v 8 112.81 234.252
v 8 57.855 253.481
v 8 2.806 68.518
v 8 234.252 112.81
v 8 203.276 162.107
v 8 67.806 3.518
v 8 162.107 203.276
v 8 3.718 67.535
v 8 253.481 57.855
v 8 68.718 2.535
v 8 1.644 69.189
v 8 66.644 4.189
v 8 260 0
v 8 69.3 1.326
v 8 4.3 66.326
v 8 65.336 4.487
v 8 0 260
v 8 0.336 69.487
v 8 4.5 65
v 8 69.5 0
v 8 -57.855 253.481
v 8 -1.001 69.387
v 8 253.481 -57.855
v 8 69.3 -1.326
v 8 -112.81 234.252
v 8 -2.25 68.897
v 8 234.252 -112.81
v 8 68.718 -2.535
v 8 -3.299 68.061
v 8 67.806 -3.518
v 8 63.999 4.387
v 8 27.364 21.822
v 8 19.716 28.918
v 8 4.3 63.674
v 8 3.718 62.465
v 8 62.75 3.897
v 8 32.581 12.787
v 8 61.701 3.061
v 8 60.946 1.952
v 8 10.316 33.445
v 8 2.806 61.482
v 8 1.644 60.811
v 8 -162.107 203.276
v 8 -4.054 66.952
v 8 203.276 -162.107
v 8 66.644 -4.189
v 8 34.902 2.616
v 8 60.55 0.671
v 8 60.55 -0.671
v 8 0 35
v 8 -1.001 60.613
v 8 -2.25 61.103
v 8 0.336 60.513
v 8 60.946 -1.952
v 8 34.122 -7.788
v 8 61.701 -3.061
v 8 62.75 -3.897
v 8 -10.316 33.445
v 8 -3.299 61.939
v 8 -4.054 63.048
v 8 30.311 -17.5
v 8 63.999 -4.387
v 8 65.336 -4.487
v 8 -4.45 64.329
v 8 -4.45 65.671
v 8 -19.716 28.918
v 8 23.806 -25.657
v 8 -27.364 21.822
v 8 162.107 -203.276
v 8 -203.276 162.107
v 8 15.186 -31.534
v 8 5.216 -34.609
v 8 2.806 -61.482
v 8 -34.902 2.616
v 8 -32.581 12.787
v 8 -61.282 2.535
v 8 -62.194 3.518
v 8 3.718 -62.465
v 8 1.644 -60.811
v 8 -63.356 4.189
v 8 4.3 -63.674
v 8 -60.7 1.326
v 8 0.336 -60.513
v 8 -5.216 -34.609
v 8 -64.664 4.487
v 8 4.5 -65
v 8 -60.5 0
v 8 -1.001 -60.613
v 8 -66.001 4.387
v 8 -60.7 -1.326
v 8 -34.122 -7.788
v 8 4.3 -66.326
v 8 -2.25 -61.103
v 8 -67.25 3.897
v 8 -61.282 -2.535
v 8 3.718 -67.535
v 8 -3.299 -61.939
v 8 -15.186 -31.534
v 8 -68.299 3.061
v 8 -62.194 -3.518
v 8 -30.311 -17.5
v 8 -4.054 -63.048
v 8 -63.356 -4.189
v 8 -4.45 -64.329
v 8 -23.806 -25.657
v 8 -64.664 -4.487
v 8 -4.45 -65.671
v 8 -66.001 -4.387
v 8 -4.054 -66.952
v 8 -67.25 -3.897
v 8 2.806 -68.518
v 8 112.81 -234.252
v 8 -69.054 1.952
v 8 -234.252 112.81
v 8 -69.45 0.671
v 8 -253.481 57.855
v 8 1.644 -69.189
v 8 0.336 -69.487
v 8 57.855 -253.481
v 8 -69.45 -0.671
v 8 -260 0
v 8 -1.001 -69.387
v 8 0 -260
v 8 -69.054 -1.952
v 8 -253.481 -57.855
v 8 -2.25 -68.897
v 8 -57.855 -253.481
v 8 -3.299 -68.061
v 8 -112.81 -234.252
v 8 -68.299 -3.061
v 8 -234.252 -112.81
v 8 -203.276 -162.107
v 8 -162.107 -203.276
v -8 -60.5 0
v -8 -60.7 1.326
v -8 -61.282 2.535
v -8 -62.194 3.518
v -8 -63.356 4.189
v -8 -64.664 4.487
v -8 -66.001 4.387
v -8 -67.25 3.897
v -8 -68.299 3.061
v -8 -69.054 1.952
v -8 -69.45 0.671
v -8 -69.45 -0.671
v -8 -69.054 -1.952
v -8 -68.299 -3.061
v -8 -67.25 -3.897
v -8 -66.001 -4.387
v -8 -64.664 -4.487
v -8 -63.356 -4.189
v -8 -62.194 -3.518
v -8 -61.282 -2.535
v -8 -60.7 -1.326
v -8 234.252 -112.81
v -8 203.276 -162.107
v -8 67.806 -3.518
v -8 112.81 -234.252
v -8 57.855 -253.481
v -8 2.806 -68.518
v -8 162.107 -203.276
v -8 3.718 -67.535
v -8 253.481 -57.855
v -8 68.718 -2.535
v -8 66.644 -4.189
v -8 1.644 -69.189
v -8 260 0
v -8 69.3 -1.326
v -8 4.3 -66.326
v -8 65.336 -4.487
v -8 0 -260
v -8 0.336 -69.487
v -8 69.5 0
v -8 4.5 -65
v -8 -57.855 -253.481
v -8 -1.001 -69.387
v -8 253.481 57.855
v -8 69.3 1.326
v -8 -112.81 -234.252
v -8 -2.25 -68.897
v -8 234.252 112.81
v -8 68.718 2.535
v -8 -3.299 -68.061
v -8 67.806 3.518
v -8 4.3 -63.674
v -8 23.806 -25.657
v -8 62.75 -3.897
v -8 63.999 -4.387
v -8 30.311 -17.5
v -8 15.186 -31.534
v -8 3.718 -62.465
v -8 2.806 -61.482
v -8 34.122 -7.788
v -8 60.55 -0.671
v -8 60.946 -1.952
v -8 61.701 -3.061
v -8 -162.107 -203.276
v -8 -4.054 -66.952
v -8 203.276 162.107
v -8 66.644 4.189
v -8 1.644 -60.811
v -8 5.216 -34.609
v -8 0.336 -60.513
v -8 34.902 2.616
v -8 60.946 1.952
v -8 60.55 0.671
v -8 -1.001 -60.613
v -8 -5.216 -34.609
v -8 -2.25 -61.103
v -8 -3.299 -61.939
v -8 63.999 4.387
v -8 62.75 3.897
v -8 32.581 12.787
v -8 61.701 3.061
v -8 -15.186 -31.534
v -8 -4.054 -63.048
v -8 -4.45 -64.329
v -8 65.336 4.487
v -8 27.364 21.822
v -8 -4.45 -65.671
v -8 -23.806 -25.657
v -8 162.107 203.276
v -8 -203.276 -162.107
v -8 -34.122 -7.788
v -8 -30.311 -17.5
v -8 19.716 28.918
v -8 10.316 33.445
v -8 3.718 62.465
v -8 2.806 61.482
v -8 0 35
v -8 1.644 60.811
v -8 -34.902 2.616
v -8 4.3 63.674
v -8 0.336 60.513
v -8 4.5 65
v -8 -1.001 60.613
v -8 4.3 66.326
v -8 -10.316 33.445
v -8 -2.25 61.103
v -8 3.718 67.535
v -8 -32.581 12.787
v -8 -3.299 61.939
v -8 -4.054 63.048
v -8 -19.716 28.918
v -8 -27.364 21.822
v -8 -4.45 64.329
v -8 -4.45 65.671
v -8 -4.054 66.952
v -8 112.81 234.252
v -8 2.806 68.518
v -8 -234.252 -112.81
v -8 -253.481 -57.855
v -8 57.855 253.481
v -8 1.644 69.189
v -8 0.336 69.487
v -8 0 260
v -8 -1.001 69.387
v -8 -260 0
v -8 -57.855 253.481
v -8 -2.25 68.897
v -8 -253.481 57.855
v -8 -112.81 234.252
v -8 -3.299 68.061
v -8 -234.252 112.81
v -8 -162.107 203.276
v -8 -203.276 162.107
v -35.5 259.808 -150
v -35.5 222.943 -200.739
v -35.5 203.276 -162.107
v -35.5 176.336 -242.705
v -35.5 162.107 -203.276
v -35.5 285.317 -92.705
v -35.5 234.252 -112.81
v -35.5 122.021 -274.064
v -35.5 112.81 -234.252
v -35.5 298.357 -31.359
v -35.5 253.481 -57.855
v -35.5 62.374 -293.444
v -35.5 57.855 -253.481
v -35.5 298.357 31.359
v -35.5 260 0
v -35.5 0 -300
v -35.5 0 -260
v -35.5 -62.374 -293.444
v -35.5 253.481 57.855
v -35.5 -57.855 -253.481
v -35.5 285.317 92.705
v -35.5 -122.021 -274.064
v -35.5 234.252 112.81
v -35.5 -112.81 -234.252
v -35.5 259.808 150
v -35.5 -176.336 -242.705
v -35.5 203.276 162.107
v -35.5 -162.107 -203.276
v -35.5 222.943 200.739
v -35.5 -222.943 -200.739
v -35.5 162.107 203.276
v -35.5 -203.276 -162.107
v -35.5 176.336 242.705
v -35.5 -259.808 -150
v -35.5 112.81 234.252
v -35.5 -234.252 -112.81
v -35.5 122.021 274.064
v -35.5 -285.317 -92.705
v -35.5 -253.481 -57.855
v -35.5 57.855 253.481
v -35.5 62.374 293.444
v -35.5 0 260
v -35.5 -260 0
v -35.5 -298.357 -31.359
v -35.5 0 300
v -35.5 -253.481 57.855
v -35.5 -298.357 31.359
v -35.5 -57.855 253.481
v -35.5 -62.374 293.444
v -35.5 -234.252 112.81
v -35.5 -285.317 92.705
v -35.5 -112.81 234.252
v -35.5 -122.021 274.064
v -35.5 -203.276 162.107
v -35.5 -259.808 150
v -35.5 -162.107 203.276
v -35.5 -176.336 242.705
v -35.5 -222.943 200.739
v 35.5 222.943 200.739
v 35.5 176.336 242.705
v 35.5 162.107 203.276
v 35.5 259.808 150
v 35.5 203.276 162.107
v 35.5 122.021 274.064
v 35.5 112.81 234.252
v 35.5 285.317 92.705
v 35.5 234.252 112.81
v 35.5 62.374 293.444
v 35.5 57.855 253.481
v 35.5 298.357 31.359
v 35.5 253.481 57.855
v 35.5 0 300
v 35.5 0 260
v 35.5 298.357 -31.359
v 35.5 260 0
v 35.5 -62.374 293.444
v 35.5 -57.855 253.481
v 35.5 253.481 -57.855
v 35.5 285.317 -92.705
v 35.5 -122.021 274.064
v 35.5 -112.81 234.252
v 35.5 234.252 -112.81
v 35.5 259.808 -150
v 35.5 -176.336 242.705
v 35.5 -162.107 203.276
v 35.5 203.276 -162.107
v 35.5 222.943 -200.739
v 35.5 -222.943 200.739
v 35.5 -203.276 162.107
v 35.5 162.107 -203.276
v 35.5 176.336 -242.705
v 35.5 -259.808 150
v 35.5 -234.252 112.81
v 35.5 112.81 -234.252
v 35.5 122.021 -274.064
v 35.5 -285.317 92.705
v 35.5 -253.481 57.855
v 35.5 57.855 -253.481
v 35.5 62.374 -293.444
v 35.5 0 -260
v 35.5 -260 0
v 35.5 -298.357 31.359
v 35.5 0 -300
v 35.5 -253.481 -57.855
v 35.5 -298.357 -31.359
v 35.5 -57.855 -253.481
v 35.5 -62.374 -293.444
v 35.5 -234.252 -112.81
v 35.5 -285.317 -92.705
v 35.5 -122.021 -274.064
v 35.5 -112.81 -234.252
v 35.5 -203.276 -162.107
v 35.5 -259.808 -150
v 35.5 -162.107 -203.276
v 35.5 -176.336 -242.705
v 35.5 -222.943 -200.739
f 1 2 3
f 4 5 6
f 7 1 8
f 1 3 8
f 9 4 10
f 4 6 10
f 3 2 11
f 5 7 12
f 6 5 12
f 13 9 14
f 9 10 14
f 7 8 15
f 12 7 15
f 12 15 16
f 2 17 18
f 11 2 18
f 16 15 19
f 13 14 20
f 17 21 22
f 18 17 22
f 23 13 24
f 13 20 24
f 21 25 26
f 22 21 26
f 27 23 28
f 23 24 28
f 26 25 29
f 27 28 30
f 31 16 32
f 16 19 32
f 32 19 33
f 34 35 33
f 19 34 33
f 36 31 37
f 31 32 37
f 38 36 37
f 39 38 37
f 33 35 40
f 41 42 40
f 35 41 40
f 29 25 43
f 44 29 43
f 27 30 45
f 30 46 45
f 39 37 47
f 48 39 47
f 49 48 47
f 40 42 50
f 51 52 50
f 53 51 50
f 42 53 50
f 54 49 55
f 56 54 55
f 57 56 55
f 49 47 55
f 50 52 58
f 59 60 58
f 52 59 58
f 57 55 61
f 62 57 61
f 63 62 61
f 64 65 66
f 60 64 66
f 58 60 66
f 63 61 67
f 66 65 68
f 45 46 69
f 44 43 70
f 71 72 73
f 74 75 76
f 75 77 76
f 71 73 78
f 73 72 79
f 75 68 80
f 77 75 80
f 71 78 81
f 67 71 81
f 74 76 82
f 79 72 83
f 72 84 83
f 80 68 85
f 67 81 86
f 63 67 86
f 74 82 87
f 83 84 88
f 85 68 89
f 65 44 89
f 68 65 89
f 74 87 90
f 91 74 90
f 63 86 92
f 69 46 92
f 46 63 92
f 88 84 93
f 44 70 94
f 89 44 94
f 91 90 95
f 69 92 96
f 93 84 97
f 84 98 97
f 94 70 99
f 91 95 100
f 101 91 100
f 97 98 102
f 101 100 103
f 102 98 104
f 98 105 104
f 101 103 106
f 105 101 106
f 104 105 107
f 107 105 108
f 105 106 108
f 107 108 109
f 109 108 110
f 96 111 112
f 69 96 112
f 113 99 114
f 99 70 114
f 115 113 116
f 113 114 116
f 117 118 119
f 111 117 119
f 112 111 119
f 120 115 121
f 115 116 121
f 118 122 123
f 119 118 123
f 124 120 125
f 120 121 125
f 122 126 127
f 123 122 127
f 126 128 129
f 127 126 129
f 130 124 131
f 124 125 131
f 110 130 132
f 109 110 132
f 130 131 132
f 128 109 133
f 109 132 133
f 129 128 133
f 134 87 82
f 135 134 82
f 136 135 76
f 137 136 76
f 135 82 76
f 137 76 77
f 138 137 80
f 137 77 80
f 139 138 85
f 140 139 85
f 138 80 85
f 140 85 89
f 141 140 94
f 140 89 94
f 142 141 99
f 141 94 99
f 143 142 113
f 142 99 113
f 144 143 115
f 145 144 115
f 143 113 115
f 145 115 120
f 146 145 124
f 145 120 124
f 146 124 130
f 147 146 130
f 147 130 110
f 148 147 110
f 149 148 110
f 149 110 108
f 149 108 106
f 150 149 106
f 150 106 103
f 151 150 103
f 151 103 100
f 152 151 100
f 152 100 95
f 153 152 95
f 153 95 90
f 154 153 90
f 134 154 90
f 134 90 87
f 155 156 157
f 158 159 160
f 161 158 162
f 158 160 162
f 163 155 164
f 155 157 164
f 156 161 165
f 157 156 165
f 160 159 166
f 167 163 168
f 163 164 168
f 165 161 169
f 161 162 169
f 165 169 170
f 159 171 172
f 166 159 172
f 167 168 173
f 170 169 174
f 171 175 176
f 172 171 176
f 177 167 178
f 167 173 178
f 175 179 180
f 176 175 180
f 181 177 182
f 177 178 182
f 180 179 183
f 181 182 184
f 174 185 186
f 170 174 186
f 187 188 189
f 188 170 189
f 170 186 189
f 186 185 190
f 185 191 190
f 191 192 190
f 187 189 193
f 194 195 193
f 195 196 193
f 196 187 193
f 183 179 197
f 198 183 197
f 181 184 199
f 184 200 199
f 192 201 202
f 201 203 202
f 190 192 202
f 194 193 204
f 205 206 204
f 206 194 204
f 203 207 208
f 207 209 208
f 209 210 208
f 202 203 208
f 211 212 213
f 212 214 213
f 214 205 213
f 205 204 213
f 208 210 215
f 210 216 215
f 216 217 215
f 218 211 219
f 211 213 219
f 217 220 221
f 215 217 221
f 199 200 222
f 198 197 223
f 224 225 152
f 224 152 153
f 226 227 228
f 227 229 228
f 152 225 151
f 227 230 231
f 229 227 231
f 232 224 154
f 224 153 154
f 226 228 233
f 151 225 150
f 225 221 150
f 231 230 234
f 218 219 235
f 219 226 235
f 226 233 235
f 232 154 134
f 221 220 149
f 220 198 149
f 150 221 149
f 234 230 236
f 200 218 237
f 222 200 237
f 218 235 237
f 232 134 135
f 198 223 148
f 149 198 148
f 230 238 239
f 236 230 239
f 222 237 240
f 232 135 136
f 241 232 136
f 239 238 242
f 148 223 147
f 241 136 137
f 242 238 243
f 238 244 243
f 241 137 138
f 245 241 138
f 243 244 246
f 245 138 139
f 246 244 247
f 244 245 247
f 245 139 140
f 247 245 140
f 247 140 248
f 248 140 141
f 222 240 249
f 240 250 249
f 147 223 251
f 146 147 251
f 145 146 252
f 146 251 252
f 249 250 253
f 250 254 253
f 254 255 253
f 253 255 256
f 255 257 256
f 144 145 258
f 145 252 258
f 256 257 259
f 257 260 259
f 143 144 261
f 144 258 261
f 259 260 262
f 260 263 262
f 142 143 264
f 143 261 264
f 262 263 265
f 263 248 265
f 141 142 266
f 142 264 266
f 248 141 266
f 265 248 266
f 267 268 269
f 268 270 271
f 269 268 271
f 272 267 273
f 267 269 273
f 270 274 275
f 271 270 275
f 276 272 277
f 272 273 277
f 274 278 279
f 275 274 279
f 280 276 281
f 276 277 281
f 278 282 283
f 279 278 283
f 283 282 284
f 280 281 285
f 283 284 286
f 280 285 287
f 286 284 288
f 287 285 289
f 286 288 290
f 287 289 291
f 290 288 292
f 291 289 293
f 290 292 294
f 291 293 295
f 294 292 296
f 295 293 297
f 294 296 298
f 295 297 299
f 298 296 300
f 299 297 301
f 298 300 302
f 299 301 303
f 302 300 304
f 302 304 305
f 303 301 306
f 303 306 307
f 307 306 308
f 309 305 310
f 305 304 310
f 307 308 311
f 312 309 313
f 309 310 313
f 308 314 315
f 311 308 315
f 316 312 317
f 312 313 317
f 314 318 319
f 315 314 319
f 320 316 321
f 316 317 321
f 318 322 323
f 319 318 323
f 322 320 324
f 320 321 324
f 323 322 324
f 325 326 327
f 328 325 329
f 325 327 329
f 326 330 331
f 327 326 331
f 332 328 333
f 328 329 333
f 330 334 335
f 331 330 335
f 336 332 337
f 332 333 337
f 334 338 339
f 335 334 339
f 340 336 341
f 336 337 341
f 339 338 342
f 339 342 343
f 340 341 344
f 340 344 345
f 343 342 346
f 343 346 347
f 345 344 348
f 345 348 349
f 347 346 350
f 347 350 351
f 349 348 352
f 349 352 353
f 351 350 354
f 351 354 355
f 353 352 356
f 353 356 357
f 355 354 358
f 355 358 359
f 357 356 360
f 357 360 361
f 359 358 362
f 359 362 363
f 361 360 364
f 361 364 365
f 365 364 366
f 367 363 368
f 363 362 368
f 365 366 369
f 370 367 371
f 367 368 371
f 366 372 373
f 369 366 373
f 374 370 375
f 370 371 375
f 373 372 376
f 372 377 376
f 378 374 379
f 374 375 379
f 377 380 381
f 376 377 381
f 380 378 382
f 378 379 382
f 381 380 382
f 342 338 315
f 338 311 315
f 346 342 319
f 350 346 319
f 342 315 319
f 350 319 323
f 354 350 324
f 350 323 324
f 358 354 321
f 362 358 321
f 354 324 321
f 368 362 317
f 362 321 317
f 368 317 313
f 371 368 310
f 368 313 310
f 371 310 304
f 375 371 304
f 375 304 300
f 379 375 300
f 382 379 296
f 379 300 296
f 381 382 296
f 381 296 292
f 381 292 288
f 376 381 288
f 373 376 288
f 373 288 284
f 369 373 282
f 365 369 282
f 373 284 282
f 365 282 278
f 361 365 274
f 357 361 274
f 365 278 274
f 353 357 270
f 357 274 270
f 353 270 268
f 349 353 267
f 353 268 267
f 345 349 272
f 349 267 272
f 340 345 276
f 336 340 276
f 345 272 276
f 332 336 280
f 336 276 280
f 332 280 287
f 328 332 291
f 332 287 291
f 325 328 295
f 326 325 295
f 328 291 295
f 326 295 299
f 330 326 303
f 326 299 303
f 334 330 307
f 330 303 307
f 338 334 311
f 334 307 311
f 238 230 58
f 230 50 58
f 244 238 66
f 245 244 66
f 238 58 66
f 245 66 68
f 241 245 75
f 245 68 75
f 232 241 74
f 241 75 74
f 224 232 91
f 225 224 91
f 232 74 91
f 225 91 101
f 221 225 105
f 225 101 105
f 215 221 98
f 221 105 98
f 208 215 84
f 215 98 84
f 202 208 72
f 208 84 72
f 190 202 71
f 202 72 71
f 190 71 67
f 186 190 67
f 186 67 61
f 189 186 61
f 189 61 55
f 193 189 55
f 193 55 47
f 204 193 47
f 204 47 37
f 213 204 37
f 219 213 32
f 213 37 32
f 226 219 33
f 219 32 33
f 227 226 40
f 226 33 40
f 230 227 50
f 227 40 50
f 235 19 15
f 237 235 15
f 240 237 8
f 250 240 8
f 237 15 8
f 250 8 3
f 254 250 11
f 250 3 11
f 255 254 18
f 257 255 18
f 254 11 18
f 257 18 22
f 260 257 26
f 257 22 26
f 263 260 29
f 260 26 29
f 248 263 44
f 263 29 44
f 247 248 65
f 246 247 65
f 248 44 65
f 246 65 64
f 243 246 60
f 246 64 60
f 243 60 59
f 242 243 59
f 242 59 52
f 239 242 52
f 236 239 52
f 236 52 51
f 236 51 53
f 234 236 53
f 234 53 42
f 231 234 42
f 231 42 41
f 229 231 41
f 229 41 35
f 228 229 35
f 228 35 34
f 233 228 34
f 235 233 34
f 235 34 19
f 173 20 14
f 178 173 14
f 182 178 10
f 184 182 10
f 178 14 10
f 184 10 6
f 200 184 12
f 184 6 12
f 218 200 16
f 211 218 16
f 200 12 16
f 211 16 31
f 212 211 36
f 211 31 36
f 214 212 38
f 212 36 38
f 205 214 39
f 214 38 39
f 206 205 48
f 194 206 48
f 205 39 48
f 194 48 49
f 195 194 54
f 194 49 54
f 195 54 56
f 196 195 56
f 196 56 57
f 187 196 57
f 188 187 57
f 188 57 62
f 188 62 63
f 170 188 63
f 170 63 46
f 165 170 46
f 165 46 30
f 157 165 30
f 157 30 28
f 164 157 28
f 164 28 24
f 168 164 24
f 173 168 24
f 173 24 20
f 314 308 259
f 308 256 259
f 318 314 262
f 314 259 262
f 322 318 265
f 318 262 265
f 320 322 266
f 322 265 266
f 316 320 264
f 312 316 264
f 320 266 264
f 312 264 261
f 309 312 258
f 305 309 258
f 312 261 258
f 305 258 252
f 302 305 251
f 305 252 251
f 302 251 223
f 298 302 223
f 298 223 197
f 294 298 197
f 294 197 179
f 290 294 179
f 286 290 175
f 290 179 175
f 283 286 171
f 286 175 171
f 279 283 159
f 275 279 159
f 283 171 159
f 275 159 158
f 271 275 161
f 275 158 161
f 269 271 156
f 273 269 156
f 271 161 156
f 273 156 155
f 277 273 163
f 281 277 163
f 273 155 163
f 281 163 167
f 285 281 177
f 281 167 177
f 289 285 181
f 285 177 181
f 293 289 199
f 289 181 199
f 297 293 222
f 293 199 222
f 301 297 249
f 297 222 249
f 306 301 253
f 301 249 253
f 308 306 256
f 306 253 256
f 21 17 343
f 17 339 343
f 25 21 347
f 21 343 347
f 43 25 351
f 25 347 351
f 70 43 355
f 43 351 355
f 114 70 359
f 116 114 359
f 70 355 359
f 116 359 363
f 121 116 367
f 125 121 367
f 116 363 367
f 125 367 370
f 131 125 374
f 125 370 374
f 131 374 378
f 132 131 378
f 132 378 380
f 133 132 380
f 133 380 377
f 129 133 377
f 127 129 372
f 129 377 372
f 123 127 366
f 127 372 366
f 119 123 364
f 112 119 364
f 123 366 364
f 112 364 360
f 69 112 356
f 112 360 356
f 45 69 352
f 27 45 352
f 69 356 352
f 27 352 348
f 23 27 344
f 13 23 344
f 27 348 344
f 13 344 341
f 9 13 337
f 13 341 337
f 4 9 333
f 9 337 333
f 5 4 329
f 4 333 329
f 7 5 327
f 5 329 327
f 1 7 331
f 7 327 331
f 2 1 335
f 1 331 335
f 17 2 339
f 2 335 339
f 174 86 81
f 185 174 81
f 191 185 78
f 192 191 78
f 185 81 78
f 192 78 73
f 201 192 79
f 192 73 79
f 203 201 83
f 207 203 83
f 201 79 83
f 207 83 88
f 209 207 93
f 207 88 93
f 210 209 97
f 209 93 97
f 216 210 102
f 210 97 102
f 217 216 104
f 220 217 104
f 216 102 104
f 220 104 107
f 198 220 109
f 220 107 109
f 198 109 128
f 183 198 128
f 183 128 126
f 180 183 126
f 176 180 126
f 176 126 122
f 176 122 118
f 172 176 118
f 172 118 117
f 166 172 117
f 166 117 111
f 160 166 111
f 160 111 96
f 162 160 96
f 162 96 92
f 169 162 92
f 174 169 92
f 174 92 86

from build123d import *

# Parameters (mm, degrees)
F2_R     = 4.5
F3_DEPTH = 25


with BuildPart() as f1:
    # F0 (on Front) → F1 (revolve)
    with BuildSketch(Plane.XZ):
        Polygon((-8, 35), (0, 35), (8, 35), (8, 260), (35.5, 260), (35.5, 300), (0, 300), (-35.5, 300), (-35.5, 260), (-8, 260), align=None)
    revolve(axis=Axis((56.93949, 0, 0), (1, 0, 0)))

    # F2 (on face) → F3 (cut)
    with BuildSketch(Plane.YZ.offset(8)):
        with Locations((0, 65)):
            Circle(F2_R)
        with Locations((-65, 0)):
            Circle(F2_R)
        with Locations((0, -65)):
            Circle(F2_R)
        with Locations((65, 0)):
            Circle(F2_R)
    extrude(amount=-F3_DEPTH, mode=Mode.SUBTRACT)


solid = f1.part
